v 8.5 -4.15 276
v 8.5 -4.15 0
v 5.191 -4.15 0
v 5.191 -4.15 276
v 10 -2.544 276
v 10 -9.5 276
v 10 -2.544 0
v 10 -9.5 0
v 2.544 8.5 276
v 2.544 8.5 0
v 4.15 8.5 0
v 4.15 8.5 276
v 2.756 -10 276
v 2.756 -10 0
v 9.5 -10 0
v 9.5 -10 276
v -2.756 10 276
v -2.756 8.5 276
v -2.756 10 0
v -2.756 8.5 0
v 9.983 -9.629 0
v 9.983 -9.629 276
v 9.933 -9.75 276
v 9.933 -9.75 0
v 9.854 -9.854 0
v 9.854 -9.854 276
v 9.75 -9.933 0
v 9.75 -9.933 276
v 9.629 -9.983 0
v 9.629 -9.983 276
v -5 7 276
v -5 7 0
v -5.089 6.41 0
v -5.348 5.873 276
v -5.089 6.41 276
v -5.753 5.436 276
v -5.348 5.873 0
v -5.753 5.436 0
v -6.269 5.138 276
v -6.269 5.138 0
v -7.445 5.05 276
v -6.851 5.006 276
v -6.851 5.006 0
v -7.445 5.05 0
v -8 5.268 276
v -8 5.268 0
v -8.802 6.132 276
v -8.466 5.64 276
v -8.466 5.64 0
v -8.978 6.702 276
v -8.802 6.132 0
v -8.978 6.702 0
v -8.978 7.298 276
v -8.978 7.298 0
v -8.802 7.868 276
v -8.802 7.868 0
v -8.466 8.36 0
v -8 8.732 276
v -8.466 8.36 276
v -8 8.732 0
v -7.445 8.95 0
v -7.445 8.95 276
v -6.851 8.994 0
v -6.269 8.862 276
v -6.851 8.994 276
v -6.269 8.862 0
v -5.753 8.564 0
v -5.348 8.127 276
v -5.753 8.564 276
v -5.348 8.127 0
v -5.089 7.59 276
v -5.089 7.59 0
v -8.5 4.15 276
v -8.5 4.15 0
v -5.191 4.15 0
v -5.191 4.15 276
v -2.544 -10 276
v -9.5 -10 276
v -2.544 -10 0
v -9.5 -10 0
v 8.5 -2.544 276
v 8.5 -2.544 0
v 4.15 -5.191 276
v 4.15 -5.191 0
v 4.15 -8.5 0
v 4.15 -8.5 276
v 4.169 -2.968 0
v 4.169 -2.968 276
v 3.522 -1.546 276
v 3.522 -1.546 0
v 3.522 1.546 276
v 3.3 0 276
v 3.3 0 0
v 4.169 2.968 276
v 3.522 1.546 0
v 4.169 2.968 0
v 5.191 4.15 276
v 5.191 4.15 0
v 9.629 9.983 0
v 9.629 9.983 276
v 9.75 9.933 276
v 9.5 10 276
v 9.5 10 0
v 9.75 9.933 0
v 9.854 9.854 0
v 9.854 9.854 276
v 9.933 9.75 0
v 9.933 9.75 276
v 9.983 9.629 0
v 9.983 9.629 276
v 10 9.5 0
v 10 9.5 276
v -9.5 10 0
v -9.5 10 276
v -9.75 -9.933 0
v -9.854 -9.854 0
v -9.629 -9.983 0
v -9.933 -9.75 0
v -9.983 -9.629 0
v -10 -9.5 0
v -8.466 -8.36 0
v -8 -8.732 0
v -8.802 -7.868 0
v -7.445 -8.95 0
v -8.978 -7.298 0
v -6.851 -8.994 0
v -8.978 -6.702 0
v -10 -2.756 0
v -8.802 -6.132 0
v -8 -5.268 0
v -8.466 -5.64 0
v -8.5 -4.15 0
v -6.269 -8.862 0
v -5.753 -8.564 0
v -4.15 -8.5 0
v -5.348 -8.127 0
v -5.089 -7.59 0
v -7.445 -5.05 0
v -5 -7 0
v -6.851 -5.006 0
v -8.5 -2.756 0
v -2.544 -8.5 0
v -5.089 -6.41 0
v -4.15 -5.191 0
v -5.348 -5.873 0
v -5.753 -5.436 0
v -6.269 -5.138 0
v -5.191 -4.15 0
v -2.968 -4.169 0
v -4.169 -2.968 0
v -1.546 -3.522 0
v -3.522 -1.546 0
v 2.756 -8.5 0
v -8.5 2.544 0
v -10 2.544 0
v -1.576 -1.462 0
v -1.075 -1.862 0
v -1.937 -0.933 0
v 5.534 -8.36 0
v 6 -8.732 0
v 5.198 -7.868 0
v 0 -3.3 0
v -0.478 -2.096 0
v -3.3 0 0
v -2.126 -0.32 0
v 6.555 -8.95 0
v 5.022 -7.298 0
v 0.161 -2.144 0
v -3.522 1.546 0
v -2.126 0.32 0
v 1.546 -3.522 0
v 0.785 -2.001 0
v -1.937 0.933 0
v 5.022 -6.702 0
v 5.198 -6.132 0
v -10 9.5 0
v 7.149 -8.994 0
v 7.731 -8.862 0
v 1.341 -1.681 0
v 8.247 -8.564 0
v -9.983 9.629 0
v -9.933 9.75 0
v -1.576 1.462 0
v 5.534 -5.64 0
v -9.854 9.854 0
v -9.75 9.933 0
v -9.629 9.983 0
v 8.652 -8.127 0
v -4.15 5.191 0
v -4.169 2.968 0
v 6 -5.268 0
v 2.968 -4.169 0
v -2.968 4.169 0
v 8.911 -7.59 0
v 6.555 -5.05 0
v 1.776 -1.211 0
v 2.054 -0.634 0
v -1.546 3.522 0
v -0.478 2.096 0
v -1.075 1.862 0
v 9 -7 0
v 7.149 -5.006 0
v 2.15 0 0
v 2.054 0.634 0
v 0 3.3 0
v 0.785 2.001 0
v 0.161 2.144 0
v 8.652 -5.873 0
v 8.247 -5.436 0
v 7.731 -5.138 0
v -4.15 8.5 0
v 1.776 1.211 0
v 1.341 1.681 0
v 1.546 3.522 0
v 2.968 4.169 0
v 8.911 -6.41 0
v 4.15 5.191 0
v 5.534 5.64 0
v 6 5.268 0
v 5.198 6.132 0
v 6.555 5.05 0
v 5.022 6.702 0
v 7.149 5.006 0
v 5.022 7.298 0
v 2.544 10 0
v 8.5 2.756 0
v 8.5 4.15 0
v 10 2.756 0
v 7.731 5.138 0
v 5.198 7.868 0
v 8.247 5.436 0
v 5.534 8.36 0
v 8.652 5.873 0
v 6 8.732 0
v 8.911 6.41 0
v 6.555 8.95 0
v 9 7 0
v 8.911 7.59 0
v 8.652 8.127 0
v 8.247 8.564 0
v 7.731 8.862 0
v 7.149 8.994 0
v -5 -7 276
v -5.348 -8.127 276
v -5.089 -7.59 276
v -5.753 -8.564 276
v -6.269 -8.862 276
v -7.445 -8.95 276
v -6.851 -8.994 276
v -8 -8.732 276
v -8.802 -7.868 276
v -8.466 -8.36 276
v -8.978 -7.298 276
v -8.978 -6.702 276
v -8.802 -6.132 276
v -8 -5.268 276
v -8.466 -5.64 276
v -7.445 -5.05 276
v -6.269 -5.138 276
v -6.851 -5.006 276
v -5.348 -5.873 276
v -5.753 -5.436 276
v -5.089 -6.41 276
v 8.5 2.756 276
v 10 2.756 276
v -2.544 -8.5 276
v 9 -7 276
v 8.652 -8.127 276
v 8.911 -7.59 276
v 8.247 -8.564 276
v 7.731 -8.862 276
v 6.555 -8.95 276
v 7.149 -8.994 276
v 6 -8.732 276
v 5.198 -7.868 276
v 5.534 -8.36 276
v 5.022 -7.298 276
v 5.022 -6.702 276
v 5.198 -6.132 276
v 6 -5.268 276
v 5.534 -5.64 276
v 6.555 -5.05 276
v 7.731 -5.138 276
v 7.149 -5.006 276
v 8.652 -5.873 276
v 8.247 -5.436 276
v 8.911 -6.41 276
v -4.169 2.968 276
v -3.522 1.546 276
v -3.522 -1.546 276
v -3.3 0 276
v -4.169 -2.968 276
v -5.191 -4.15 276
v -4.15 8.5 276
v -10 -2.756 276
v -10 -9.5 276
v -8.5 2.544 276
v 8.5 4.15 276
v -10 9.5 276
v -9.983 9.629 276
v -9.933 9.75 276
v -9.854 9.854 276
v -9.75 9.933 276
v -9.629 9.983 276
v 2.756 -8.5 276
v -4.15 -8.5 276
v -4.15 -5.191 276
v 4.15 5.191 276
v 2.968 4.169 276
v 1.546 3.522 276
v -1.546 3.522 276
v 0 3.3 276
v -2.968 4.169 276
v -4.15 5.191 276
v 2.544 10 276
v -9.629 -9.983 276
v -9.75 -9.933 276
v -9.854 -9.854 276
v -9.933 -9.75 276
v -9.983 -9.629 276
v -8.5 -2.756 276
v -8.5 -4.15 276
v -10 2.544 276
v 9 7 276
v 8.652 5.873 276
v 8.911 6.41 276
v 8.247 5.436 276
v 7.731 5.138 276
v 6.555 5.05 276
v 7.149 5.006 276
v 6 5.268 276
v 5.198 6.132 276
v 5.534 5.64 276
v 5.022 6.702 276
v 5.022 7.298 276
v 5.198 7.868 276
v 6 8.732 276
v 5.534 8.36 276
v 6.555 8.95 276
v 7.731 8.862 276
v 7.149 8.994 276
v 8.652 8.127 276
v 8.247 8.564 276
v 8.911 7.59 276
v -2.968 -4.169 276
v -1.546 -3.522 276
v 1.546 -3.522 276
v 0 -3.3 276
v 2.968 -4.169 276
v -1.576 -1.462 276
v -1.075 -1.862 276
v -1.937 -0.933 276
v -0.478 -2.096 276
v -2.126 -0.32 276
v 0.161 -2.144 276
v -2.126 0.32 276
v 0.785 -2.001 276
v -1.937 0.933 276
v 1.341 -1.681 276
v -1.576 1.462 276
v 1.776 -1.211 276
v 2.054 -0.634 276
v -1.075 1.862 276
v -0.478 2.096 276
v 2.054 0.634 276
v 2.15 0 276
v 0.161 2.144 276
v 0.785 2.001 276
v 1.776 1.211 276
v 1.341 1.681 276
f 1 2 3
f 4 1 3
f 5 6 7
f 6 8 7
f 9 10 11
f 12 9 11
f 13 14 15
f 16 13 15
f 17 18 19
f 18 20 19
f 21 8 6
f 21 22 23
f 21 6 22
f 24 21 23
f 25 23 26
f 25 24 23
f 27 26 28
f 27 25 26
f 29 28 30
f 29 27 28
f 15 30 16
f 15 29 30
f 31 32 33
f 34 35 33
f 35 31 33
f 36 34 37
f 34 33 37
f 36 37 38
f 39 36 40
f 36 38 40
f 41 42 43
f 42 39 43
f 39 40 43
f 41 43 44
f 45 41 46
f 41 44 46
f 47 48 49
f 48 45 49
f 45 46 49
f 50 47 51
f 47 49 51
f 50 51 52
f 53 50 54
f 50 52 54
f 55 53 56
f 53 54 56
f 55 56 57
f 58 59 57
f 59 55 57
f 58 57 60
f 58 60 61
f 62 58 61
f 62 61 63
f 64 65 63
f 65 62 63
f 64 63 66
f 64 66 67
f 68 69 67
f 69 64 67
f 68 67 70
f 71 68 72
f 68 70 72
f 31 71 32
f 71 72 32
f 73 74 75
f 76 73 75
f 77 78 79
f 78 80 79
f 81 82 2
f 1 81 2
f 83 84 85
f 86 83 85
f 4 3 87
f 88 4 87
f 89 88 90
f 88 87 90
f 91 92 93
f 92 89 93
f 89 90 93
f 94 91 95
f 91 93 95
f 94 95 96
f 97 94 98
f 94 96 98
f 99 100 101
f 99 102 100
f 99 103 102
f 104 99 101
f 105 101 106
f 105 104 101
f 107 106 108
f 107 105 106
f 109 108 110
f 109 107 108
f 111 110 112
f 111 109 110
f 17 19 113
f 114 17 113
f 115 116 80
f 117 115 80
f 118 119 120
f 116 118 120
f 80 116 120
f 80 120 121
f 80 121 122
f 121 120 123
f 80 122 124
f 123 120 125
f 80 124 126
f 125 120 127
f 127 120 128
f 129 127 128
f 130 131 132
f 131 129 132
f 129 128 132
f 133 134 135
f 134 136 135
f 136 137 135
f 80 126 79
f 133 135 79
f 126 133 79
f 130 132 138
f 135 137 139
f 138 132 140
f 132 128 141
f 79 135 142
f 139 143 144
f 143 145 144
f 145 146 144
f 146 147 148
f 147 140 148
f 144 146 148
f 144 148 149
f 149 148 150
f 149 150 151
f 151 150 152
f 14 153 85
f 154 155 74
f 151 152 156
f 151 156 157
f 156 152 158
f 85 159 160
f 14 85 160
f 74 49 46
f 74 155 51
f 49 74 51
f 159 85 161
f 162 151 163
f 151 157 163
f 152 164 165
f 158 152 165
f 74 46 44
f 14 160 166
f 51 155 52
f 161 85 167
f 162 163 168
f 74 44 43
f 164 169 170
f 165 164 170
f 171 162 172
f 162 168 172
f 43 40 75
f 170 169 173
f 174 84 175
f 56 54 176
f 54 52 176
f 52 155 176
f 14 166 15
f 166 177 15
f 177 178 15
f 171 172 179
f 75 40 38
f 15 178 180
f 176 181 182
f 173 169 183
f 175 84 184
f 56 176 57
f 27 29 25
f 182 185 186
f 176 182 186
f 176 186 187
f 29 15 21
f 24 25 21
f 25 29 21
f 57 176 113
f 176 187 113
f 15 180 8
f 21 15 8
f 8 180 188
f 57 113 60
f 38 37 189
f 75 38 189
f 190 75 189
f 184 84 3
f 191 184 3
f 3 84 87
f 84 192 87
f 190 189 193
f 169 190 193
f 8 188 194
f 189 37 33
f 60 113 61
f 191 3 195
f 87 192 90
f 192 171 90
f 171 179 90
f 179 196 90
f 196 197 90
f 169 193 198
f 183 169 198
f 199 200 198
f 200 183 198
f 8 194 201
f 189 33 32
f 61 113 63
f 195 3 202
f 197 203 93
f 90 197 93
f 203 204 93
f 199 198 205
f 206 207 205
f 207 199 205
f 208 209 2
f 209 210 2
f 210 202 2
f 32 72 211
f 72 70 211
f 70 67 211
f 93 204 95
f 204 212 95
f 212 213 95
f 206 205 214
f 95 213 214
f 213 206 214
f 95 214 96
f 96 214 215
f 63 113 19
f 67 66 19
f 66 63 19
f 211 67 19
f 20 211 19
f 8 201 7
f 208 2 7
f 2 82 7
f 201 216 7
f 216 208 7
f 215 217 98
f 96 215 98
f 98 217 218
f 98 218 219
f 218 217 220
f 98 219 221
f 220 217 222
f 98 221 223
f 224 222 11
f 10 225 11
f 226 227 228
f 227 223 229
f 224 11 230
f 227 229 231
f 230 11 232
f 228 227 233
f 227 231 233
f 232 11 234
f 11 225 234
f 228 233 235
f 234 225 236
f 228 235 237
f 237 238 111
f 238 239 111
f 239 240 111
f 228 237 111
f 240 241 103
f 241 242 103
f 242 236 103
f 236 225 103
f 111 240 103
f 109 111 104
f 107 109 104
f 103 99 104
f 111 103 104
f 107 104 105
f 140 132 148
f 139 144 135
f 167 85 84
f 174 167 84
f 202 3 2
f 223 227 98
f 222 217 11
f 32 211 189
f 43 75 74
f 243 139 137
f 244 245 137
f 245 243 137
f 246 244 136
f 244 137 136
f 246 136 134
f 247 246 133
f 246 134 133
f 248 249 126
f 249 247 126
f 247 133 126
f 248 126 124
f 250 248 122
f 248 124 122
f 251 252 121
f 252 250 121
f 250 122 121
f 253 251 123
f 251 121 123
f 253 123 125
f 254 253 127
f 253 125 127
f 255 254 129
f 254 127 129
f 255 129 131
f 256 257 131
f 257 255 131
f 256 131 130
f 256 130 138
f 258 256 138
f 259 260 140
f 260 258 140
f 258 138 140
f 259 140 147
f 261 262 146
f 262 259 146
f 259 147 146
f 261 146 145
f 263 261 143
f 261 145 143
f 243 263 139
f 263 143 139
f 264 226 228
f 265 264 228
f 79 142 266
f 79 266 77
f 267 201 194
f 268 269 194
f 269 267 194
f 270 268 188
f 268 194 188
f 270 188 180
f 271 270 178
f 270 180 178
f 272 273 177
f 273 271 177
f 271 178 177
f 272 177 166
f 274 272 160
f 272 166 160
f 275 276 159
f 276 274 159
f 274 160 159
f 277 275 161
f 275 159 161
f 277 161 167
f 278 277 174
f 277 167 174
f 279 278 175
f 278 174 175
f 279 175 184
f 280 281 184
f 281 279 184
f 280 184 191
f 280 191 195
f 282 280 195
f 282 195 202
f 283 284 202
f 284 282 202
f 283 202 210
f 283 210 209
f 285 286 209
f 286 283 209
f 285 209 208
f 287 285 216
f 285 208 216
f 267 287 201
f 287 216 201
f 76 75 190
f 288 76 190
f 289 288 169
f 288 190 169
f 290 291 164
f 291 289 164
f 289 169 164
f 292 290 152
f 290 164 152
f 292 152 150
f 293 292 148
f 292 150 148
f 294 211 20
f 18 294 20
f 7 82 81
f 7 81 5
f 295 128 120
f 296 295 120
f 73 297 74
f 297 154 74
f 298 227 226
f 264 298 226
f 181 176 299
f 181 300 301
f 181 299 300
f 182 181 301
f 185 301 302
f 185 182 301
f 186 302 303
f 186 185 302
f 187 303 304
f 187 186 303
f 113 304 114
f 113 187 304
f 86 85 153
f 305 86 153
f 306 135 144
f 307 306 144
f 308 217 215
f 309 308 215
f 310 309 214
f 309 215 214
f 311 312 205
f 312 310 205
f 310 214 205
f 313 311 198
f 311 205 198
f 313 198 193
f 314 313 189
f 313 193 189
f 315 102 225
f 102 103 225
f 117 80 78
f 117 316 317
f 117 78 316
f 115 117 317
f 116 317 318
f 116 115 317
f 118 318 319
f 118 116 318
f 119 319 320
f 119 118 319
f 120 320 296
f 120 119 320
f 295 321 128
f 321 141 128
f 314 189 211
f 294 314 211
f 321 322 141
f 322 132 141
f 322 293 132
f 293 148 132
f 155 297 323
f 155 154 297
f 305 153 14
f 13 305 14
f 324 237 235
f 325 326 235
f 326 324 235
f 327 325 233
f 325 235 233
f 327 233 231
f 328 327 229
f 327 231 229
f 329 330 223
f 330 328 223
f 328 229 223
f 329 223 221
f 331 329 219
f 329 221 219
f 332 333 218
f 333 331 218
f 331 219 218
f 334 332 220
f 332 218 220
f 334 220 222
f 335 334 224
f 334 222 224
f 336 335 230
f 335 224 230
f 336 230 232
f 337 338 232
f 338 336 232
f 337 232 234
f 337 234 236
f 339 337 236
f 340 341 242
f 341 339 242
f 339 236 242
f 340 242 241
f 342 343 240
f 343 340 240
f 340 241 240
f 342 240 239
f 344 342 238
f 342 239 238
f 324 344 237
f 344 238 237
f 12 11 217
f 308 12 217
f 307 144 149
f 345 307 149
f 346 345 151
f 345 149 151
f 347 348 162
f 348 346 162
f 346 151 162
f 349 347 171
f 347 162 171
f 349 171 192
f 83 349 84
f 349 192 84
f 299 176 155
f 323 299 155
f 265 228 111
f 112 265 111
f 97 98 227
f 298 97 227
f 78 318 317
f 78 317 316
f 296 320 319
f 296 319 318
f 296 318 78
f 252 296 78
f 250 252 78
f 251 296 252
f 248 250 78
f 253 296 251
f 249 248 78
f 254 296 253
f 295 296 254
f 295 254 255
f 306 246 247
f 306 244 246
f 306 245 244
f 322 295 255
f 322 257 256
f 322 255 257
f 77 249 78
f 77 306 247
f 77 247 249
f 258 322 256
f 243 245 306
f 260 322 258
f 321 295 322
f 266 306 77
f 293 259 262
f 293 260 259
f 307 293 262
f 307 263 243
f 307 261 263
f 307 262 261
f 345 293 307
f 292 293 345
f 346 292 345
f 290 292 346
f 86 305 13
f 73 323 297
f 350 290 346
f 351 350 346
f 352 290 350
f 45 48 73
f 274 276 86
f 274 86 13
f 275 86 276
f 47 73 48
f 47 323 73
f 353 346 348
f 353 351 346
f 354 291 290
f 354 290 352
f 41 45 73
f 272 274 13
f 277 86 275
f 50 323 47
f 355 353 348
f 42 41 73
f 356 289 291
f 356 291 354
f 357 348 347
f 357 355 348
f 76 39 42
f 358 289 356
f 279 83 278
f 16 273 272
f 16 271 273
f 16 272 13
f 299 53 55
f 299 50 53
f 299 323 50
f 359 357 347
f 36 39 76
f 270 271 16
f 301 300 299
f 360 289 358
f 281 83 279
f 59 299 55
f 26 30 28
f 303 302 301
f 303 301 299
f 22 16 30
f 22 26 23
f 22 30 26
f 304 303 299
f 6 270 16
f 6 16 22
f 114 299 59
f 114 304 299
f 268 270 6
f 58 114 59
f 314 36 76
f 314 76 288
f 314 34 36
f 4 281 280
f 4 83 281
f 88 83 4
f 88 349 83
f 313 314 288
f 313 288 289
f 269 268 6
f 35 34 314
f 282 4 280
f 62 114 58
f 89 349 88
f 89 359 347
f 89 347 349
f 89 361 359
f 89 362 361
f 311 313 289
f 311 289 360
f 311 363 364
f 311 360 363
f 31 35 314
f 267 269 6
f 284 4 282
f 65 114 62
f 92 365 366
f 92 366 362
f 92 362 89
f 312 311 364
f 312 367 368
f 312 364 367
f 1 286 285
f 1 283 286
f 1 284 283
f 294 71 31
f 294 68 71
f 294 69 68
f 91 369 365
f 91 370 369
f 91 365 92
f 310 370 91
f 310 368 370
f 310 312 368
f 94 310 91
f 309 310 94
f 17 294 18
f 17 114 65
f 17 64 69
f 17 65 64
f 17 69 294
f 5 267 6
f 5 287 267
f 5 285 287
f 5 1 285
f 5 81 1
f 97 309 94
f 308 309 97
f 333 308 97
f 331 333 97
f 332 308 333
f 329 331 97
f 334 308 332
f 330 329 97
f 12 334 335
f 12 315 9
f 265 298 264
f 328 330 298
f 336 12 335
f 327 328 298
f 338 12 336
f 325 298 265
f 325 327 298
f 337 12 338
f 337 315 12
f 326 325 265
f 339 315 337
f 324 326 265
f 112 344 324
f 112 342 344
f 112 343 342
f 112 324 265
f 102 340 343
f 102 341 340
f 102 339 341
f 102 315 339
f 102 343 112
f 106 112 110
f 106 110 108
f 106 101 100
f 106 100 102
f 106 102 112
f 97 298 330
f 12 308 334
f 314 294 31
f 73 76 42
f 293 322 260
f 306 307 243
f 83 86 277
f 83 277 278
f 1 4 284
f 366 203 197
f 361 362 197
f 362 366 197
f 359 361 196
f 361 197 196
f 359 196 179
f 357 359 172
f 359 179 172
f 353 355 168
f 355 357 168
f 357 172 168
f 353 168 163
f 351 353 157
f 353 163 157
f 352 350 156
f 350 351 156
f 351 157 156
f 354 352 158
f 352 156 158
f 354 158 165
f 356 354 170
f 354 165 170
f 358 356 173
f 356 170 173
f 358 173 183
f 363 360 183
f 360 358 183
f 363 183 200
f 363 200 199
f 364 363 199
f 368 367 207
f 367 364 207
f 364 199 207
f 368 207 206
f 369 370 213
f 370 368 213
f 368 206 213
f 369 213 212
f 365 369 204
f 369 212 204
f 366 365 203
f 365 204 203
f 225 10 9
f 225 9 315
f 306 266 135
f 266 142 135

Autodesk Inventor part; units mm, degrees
ref_plane "YZ Plane" through (0, 0, 0) normal (1, 0, 0) x (0, 1, 0)
ref_plane "XZ Plane" through (0, 0, 0) normal (0, 1, 0) x (-1, 0, 0)
ref_plane "XY Plane" through (0, 0, 0) normal (0, 0, 1) x (1, 0, 0)
sketch "Sketch1" plane through (0, 0, 0) normal (0, 0, 1) x (1, 0, 0)
  line L0 (-10, -10) -> (10, 10) construction
  line L1 (10, -10) -> (-10, 10) construction
  arc A0 (-10, -9.5) -> (-9.5, -10) centre (-9.5, -9.5) ccw
  arc A1 (-9.5, 10) -> (-10, 9.5) centre (-9.5, 9.5) ccw
  arc A2 (10, 9.5) -> (9.5, 10) centre (9.5, 9.5) ccw
  arc A3 (9.5, -10) -> (10, -9.5) centre (9.5, -9.5) ccw
  line L2 (7, -7) -> (-7, -7) construction
  line L3 (-7, -7) -> (-7, 7) construction
  line L4 (-7, 7) -> (7, 7) construction
  line L5 (7, 7) -> (7, -7) construction
  line L6 (7, -7) -> (-7, 7) construction
  line L7 (-7, -7) -> (7, 7) construction
  circle A4 centre (-7, -7) radius 2
  circle A5 centre (-7, 7) radius 2
  circle A6 centre (7, 7) radius 2
  circle A7 centre (7, -7) radius 2
  circle A8 centre (0, 0) radius 2.15
  line L8 (-8.5, 4.15) -> (-5.1906, 4.15)
  arc A9 (-5.1906, -4.15) -> (-5.1906, 4.15) centre (-8.8, 0) ccw
  line L9 (-5.1906, -4.15) -> (-8.5, -4.15)
  line L10 (-8.5, -4.15) -> (-8.5, -2.7559)
  line L11 (-8.5, 2.5441) -> (-8.5, 4.15)
  line L12 (-5.1906, -4.15) -> (-5.1906, 4.15) construction
  line L13 (-8.5, -2.7559) -> (-10, -2.7559)
  line L14 (-8.5, 2.5441) -> (-10, 2.5441)
  line L15 (-10, 9.5) -> (-10, 2.5441)
  line L16 (-10, -2.7559) -> (-10, -9.5)
  line L17 (4.15, -8.5) -> (2.7559, -8.5)
  line L18 (2.7559, -8.5) -> (2.7559, -10)
  line L19 (4.15, -5.1906) -> (-4.15, -5.1906) construction
  arc A10 (4.15, -5.1906) -> (-4.15, -5.1906) centre (0, -8.8) ccw
  line L20 (7, -7) -> (-7, 7) construction
  line L21 (10, -10) -> (-10, 10) construction
  line L22 (-4.15, -8.5) -> (-4.15, -5.1906)
  line L23 (4.15, -5.1906) -> (4.15, -8.5)
  line L24 (-2.5441, -8.5) -> (-2.5441, -10)
  line L25 (-2.5441, -8.5) -> (-4.15, -8.5)
  line L26 (8.5, 4.15) -> (8.5, 2.7559)
  line L27 (8.5, 2.7559) -> (10, 2.7559)
  line L28 (5.1906, 4.15) -> (5.1906, -4.15) construction
  arc A11 (5.1906, 4.15) -> (5.1906, -4.15) centre (8.8, 0) ccw
  line L29 (7, 7) -> (-7, -7) construction
  line L30 (10, 10) -> (-10, -10) construction
  line L31 (8.5, -4.15) -> (5.1906, -4.15)
  line L32 (5.1906, 4.15) -> (8.5, 4.15)
  line L33 (8.5, -2.5441) -> (10, -2.5441)
  line L34 (8.5, -2.5441) -> (8.5, -4.15)
  line L35 (-4.15, 8.5) -> (-2.7559, 8.5)
  line L36 (-2.7559, 8.5) -> (-2.7559, 10)
  line L37 (-4.15, 5.1906) -> (4.15, 5.1906) construction
  arc A12 (-4.15, 5.1906) -> (4.15, 5.1906) centre (0, 8.8) ccw
  line L38 (-7, 7) -> (7, -7) construction
  line L39 (-10, 10) -> (10, -10) construction
  line L40 (4.15, 8.5) -> (4.15, 5.1906)
  line L41 (-4.15, 5.1906) -> (-4.15, 8.5)
  line L42 (2.5441, 8.5) -> (2.5441, 10)
  line L43 (2.5441, 8.5) -> (4.15, 8.5)
  line L44 (-9.5, -10) -> (-2.5441, -10)
  line L45 (2.7559, -10) -> (9.5, -10)
  line L46 (9.5, 10) -> (2.5441, 10)
  line L47 (-2.7559, 10) -> (-9.5, 10)
  line L48 (10, -9.5) -> (10, -2.5441)
  line L49 (10, 2.7559) -> (10, 9.5)
  line L50 (2292.4151, 1187.1915) -> (2314.8128, 1187.1915)
  circle A13 centre (2303.6139, 1187.1915) radius 2.15
  line L51 (2307.7639, 1192.1343) -> (2307.7639, 1195.3915)
  arc A14 (2307.7639, 1195.3915) -> (2307.4639, 1195.6915) centre (2307.4639, 1195.3915) ccw
  line L52 (2307.4639, 1195.6915) -> (2306.5639, 1195.6915)
  arc A15 (2306.2639, 1195.9915) -> (2306.5639, 1195.6915) centre (2306.5639, 1195.9915) ccw
  line L53 (2306.2639, 1195.9915) -> (2306.2639, 1196.8915)
  arc A16 (2306.5639, 1197.1915) -> (2306.2639, 1196.8915) centre (2306.5639, 1196.8915) ccw
  line L54 (2306.5639, 1197.1915) -> (2313.3139, 1197.1915)
  arc A17 (2313.6139, 1196.8915) -> (2313.3139, 1197.1915) centre (2313.3139, 1196.8915) ccw
  line L55 (2313.6139, 1196.8915) -> (2313.6139, 1190.1415)
  arc A18 (2313.3139, 1189.8415) -> (2313.6139, 1190.1415) centre (2313.3139, 1190.1415) ccw
  line L56 (2313.3139, 1189.8415) -> (2312.4139, 1189.8415)
  arc A19 (2312.1139, 1190.1415) -> (2312.4139, 1189.8415) centre (2312.4139, 1190.1415) ccw
  line L57 (2312.1139, 1190.1415) -> (2312.1139, 1191.0415)
  arc A20 (2312.1139, 1191.0415) -> (2311.8139, 1191.3415) centre (2311.8139, 1191.0415) ccw
  line L58 (2311.8139, 1191.3415) -> (2308.5567, 1191.3415)
  arc A21 (2308.5567, 1191.3415) -> (2308.3217, 1191.2281) centre (2308.5567, 1191.0415) ccw
  arc A22 (2308.3217, 1191.2281) -> (2306.9212, 1187.4988) centre (2313.4048, 1187.1915) ccw
  line L59 (2306.9212, 1187.4988) -> (2306.6139, 1187.1915)
  line L60 (2306.6139, 1187.1915) -> (2306.9212, 1186.8843)
  arc A23 (2306.9212, 1186.8843) -> (2308.3217, 1183.155) centre (2313.4048, 1187.1915) ccw
  arc A24 (2308.3217, 1183.155) -> (2308.5567, 1183.0415) centre (2308.5567, 1183.3415) ccw
  line L61 (2308.5567, 1183.0415) -> (2311.8139, 1183.0415)
  arc A25 (2311.8139, 1183.0415) -> (2312.1139, 1183.3415) centre (2311.8139, 1183.3415) ccw
  line L62 (2312.1139, 1183.3415) -> (2312.1139, 1184.2415)
  arc A26 (2312.4139, 1184.5415) -> (2312.1139, 1184.2415) centre (2312.4139, 1184.2415) ccw
  line L63 (2312.4139, 1184.5415) -> (2313.3139, 1184.5415)
  arc A27 (2313.6139, 1184.2415) -> (2313.3139, 1184.5415) centre (2313.3139, 1184.2415) ccw
  line L64 (2313.6139, 1184.2415) -> (2313.6139, 1177.4915)
  arc A28 (2313.3139, 1177.1915) -> (2313.6139, 1177.4915) centre (2313.3139, 1177.4915) ccw
  line L65 (2313.3139, 1177.1915) -> (2306.5639, 1177.1915)
  arc A29 (2306.2639, 1177.4915) -> (2306.5639, 1177.1915) centre (2306.5639, 1177.4915) ccw
  line L66 (2306.2639, 1177.4915) -> (2306.2639, 1178.3915)
  arc A30 (2306.5639, 1178.6915) -> (2306.2639, 1178.3915) centre (2306.5639, 1178.3915) ccw
  line L67 (2306.5639, 1178.6915) -> (2307.4639, 1178.6915)
  arc A31 (2307.4639, 1178.6915) -> (2307.7639, 1178.9915) centre (2307.4639, 1178.9915) ccw
  line L68 (2307.7639, 1178.9915) -> (2307.7639, 1182.2488)
  arc A32 (2307.7639, 1182.2488) -> (2307.6505, 1182.4837) centre (2307.4639, 1182.2488) ccw
  arc A33 (2307.6505, 1182.4837) -> (2303.9212, 1183.8843) centre (2303.6139, 1177.4007) ccw
  line L69 (2303.9212, 1183.8843) -> (2303.6139, 1184.1915)
  line L70 (2303.6139, 1184.1915) -> (2303.3066, 1183.8843)
  arc A34 (2303.3066, 1183.8843) -> (2299.5774, 1182.4837) centre (2303.6139, 1177.4007) ccw
  arc A35 (2299.5774, 1182.4837) -> (2299.4639, 1182.2488) centre (2299.7639, 1182.2488) ccw
  line L71 (2299.4639, 1182.2488) -> (2299.4639, 1178.9915)
  arc A36 (2299.4639, 1178.9915) -> (2299.7639, 1178.6915) centre (2299.7639, 1178.9915) ccw
  line L72 (2299.7639, 1178.6915) -> (2300.6639, 1178.6915)
  arc A37 (2300.9639, 1178.3915) -> (2300.6639, 1178.6915) centre (2300.6639, 1178.3915) ccw
  line L73 (2300.9639, 1178.3915) -> (2300.9639, 1177.4915)
  arc A38 (2300.6639, 1177.1915) -> (2300.9639, 1177.4915) centre (2300.6639, 1177.4915) ccw
  line L74 (2300.6639, 1177.1915) -> (2293.9139, 1177.1915)
  arc A39 (2293.6139, 1177.4915) -> (2293.9139, 1177.1915) centre (2293.9139, 1177.4915) ccw
  line L75 (2293.6139, 1177.4915) -> (2293.6139, 1184.2415)
  arc A40 (2293.9139, 1184.5415) -> (2293.6139, 1184.2415) centre (2293.9139, 1184.2415) ccw
  line L76 (2293.9139, 1184.5415) -> (2294.8139, 1184.5415)
  arc A41 (2295.1139, 1184.2415) -> (2294.8139, 1184.5415) centre (2294.8139, 1184.2415) ccw
  line L77 (2295.1139, 1184.2415) -> (2295.1139, 1183.3415)
  arc A42 (2295.1139, 1183.3415) -> (2295.4139, 1183.0415) centre (2295.4139, 1183.3415) ccw
  line L78 (2295.4139, 1183.0415) -> (2298.6712, 1183.0415)
  arc A43 (2298.6712, 1183.0415) -> (2298.9061, 1183.155) centre (2298.6712, 1183.3415) ccw
  arc A44 (2298.9061, 1183.155) -> (2300.3066, 1186.8843) centre (2293.8231, 1187.1915) ccw
  line L79 (2300.3066, 1186.8843) -> (2300.6139, 1187.1915)
  line L80 (2300.6139, 1187.1915) -> (2300.3066, 1187.4988)
  arc A45 (2300.3066, 1187.4988) -> (2298.9061, 1191.2281) centre (2293.8231, 1187.1915) ccw
  arc A46 (2298.9061, 1191.2281) -> (2298.6712, 1191.3415) centre (2298.6712, 1191.0415) ccw
  line L81 (2298.6712, 1191.3415) -> (2295.4139, 1191.3415)
  arc A47 (2295.4139, 1191.3415) -> (2295.1139, 1191.0415) centre (2295.4139, 1191.0415) ccw
  line L82 (2295.1139, 1191.0415) -> (2295.1139, 1190.1415)
  arc A48 (2294.8139, 1189.8415) -> (2295.1139, 1190.1415) centre (2294.8139, 1190.1415) ccw
  line L83 (2294.8139, 1189.8415) -> (2293.9139, 1189.8415)
  arc A49 (2293.6139, 1190.1415) -> (2293.9139, 1189.8415) centre (2293.9139, 1190.1415) ccw
  line L84 (2293.6139, 1190.1415) -> (2293.6139, 1196.8915)
  arc A50 (2293.9139, 1197.1915) -> (2293.6139, 1196.8915) centre (2293.9139, 1196.8915) ccw
  line L85 (2293.9139, 1197.1915) -> (2300.6639, 1197.1915)
  arc A51 (2300.9639, 1196.8915) -> (2300.6639, 1197.1915) centre (2300.6639, 1196.8915) ccw
  line L86 (2300.9639, 1196.8915) -> (2300.9639, 1195.9915)
  arc A52 (2300.6639, 1195.6915) -> (2300.9639, 1195.9915) centre (2300.6639, 1195.9915) ccw
  line L87 (2300.6639, 1195.6915) -> (2299.7639, 1195.6915)
  arc A53 (2299.7639, 1195.6915) -> (2299.4639, 1195.3915) centre (2299.7639, 1195.3915) ccw
  line L88 (2299.4639, 1195.3915) -> (2299.4639, 1192.1343)
  arc A54 (2299.4639, 1192.1343) -> (2299.5774, 1191.8994) centre (2299.7639, 1192.1343) ccw
  arc A55 (2299.5774, 1191.8994) -> (2303.3066, 1190.4988) centre (2303.6139, 1196.9824) ccw
  line L89 (2303.3066, 1190.4988) -> (2303.6139, 1190.1915)
  line L90 (2303.6139, 1190.1915) -> (2303.9212, 1190.4988)
  arc A56 (2303.9212, 1190.4988) -> (2307.6505, 1191.8994) centre (2303.6139, 1196.9824) ccw
  arc A57 (2307.6505, 1191.8994) -> (2307.7639, 1192.1343) centre (2307.4639, 1192.1343) ccw
  line L91 (2294.1139, 1194.1915) -> (2299.1139, 1194.1915)
  line L92 (2296.6139, 1196.6915) -> (2296.6139, 1191.6915)
  circle A58 centre (2296.6139, 1194.1915) radius 2
  line L93 (2294.1139, 1180.1915) -> (2299.1139, 1180.1915)
  line L94 (2296.6139, 1177.6915) -> (2296.6139, 1182.6915)
  circle A59 centre (2296.6139, 1180.1915) radius 2
  line L95 (2303.6139, 1198.3904) -> (2303.6139, 1175.9927)
  line L96 (2313.1139, 1194.1915) -> (2308.1139, 1194.1915)
  line L97 (2310.6139, 1196.6915) -> (2310.6139, 1191.6915)
  circle A60 centre (2310.6139, 1194.1915) radius 2
  circle A61 centre (2310.6139, 1180.1915) radius 2
  line L98 (2310.6139, 1177.6915) -> (2310.6139, 1182.6915)
  line L99 (2313.1139, 1180.1915) -> (2308.1139, 1180.1915)
  point P0 (-10, 0)
  point P1 (-5.8595, 0)
  point P2 (-5.1906, 0)
  point P3 (-10, 0)
  point P4 (0, -5.8595)
  point P5 (0, -5.1906)
  point P6 (5.8595, 0)
  point P7 (5.1906, 0)
  point P8 (0, 5.8595)
  point P9 (0, 5.1906)
  dimension "d0" = 20
  dimension "d1" = 20
  dimension "d2" = 0.5
  dimension "d3" = 14
  dimension "d4" = 14
  dimension "d5" = 4
  dimension "d6" = 4.3
  dimension "d13" = 5.5
  dimension "d14" = 8.3
  dimension "d16" = 5.3
  dimension "d17" = 6.7
  dimension "d18" = 1.5
  dimension "d21" = 360
extrude "Extrusion1" add sketch "Sketch1" along normal blind 276 contours L16 L13 L10 L9 A9 L8 L11 L14 L15 A1 L47 L36 L35 L41 A12 L40 L43 L42 L46 A2 L49 L27 L26 L32 A11 L31 L34 L33 L48 A3 L45 L18 L17 L23 A10 L22 L25 L24 L44 A0
properties part number "Profile_CPY2"
